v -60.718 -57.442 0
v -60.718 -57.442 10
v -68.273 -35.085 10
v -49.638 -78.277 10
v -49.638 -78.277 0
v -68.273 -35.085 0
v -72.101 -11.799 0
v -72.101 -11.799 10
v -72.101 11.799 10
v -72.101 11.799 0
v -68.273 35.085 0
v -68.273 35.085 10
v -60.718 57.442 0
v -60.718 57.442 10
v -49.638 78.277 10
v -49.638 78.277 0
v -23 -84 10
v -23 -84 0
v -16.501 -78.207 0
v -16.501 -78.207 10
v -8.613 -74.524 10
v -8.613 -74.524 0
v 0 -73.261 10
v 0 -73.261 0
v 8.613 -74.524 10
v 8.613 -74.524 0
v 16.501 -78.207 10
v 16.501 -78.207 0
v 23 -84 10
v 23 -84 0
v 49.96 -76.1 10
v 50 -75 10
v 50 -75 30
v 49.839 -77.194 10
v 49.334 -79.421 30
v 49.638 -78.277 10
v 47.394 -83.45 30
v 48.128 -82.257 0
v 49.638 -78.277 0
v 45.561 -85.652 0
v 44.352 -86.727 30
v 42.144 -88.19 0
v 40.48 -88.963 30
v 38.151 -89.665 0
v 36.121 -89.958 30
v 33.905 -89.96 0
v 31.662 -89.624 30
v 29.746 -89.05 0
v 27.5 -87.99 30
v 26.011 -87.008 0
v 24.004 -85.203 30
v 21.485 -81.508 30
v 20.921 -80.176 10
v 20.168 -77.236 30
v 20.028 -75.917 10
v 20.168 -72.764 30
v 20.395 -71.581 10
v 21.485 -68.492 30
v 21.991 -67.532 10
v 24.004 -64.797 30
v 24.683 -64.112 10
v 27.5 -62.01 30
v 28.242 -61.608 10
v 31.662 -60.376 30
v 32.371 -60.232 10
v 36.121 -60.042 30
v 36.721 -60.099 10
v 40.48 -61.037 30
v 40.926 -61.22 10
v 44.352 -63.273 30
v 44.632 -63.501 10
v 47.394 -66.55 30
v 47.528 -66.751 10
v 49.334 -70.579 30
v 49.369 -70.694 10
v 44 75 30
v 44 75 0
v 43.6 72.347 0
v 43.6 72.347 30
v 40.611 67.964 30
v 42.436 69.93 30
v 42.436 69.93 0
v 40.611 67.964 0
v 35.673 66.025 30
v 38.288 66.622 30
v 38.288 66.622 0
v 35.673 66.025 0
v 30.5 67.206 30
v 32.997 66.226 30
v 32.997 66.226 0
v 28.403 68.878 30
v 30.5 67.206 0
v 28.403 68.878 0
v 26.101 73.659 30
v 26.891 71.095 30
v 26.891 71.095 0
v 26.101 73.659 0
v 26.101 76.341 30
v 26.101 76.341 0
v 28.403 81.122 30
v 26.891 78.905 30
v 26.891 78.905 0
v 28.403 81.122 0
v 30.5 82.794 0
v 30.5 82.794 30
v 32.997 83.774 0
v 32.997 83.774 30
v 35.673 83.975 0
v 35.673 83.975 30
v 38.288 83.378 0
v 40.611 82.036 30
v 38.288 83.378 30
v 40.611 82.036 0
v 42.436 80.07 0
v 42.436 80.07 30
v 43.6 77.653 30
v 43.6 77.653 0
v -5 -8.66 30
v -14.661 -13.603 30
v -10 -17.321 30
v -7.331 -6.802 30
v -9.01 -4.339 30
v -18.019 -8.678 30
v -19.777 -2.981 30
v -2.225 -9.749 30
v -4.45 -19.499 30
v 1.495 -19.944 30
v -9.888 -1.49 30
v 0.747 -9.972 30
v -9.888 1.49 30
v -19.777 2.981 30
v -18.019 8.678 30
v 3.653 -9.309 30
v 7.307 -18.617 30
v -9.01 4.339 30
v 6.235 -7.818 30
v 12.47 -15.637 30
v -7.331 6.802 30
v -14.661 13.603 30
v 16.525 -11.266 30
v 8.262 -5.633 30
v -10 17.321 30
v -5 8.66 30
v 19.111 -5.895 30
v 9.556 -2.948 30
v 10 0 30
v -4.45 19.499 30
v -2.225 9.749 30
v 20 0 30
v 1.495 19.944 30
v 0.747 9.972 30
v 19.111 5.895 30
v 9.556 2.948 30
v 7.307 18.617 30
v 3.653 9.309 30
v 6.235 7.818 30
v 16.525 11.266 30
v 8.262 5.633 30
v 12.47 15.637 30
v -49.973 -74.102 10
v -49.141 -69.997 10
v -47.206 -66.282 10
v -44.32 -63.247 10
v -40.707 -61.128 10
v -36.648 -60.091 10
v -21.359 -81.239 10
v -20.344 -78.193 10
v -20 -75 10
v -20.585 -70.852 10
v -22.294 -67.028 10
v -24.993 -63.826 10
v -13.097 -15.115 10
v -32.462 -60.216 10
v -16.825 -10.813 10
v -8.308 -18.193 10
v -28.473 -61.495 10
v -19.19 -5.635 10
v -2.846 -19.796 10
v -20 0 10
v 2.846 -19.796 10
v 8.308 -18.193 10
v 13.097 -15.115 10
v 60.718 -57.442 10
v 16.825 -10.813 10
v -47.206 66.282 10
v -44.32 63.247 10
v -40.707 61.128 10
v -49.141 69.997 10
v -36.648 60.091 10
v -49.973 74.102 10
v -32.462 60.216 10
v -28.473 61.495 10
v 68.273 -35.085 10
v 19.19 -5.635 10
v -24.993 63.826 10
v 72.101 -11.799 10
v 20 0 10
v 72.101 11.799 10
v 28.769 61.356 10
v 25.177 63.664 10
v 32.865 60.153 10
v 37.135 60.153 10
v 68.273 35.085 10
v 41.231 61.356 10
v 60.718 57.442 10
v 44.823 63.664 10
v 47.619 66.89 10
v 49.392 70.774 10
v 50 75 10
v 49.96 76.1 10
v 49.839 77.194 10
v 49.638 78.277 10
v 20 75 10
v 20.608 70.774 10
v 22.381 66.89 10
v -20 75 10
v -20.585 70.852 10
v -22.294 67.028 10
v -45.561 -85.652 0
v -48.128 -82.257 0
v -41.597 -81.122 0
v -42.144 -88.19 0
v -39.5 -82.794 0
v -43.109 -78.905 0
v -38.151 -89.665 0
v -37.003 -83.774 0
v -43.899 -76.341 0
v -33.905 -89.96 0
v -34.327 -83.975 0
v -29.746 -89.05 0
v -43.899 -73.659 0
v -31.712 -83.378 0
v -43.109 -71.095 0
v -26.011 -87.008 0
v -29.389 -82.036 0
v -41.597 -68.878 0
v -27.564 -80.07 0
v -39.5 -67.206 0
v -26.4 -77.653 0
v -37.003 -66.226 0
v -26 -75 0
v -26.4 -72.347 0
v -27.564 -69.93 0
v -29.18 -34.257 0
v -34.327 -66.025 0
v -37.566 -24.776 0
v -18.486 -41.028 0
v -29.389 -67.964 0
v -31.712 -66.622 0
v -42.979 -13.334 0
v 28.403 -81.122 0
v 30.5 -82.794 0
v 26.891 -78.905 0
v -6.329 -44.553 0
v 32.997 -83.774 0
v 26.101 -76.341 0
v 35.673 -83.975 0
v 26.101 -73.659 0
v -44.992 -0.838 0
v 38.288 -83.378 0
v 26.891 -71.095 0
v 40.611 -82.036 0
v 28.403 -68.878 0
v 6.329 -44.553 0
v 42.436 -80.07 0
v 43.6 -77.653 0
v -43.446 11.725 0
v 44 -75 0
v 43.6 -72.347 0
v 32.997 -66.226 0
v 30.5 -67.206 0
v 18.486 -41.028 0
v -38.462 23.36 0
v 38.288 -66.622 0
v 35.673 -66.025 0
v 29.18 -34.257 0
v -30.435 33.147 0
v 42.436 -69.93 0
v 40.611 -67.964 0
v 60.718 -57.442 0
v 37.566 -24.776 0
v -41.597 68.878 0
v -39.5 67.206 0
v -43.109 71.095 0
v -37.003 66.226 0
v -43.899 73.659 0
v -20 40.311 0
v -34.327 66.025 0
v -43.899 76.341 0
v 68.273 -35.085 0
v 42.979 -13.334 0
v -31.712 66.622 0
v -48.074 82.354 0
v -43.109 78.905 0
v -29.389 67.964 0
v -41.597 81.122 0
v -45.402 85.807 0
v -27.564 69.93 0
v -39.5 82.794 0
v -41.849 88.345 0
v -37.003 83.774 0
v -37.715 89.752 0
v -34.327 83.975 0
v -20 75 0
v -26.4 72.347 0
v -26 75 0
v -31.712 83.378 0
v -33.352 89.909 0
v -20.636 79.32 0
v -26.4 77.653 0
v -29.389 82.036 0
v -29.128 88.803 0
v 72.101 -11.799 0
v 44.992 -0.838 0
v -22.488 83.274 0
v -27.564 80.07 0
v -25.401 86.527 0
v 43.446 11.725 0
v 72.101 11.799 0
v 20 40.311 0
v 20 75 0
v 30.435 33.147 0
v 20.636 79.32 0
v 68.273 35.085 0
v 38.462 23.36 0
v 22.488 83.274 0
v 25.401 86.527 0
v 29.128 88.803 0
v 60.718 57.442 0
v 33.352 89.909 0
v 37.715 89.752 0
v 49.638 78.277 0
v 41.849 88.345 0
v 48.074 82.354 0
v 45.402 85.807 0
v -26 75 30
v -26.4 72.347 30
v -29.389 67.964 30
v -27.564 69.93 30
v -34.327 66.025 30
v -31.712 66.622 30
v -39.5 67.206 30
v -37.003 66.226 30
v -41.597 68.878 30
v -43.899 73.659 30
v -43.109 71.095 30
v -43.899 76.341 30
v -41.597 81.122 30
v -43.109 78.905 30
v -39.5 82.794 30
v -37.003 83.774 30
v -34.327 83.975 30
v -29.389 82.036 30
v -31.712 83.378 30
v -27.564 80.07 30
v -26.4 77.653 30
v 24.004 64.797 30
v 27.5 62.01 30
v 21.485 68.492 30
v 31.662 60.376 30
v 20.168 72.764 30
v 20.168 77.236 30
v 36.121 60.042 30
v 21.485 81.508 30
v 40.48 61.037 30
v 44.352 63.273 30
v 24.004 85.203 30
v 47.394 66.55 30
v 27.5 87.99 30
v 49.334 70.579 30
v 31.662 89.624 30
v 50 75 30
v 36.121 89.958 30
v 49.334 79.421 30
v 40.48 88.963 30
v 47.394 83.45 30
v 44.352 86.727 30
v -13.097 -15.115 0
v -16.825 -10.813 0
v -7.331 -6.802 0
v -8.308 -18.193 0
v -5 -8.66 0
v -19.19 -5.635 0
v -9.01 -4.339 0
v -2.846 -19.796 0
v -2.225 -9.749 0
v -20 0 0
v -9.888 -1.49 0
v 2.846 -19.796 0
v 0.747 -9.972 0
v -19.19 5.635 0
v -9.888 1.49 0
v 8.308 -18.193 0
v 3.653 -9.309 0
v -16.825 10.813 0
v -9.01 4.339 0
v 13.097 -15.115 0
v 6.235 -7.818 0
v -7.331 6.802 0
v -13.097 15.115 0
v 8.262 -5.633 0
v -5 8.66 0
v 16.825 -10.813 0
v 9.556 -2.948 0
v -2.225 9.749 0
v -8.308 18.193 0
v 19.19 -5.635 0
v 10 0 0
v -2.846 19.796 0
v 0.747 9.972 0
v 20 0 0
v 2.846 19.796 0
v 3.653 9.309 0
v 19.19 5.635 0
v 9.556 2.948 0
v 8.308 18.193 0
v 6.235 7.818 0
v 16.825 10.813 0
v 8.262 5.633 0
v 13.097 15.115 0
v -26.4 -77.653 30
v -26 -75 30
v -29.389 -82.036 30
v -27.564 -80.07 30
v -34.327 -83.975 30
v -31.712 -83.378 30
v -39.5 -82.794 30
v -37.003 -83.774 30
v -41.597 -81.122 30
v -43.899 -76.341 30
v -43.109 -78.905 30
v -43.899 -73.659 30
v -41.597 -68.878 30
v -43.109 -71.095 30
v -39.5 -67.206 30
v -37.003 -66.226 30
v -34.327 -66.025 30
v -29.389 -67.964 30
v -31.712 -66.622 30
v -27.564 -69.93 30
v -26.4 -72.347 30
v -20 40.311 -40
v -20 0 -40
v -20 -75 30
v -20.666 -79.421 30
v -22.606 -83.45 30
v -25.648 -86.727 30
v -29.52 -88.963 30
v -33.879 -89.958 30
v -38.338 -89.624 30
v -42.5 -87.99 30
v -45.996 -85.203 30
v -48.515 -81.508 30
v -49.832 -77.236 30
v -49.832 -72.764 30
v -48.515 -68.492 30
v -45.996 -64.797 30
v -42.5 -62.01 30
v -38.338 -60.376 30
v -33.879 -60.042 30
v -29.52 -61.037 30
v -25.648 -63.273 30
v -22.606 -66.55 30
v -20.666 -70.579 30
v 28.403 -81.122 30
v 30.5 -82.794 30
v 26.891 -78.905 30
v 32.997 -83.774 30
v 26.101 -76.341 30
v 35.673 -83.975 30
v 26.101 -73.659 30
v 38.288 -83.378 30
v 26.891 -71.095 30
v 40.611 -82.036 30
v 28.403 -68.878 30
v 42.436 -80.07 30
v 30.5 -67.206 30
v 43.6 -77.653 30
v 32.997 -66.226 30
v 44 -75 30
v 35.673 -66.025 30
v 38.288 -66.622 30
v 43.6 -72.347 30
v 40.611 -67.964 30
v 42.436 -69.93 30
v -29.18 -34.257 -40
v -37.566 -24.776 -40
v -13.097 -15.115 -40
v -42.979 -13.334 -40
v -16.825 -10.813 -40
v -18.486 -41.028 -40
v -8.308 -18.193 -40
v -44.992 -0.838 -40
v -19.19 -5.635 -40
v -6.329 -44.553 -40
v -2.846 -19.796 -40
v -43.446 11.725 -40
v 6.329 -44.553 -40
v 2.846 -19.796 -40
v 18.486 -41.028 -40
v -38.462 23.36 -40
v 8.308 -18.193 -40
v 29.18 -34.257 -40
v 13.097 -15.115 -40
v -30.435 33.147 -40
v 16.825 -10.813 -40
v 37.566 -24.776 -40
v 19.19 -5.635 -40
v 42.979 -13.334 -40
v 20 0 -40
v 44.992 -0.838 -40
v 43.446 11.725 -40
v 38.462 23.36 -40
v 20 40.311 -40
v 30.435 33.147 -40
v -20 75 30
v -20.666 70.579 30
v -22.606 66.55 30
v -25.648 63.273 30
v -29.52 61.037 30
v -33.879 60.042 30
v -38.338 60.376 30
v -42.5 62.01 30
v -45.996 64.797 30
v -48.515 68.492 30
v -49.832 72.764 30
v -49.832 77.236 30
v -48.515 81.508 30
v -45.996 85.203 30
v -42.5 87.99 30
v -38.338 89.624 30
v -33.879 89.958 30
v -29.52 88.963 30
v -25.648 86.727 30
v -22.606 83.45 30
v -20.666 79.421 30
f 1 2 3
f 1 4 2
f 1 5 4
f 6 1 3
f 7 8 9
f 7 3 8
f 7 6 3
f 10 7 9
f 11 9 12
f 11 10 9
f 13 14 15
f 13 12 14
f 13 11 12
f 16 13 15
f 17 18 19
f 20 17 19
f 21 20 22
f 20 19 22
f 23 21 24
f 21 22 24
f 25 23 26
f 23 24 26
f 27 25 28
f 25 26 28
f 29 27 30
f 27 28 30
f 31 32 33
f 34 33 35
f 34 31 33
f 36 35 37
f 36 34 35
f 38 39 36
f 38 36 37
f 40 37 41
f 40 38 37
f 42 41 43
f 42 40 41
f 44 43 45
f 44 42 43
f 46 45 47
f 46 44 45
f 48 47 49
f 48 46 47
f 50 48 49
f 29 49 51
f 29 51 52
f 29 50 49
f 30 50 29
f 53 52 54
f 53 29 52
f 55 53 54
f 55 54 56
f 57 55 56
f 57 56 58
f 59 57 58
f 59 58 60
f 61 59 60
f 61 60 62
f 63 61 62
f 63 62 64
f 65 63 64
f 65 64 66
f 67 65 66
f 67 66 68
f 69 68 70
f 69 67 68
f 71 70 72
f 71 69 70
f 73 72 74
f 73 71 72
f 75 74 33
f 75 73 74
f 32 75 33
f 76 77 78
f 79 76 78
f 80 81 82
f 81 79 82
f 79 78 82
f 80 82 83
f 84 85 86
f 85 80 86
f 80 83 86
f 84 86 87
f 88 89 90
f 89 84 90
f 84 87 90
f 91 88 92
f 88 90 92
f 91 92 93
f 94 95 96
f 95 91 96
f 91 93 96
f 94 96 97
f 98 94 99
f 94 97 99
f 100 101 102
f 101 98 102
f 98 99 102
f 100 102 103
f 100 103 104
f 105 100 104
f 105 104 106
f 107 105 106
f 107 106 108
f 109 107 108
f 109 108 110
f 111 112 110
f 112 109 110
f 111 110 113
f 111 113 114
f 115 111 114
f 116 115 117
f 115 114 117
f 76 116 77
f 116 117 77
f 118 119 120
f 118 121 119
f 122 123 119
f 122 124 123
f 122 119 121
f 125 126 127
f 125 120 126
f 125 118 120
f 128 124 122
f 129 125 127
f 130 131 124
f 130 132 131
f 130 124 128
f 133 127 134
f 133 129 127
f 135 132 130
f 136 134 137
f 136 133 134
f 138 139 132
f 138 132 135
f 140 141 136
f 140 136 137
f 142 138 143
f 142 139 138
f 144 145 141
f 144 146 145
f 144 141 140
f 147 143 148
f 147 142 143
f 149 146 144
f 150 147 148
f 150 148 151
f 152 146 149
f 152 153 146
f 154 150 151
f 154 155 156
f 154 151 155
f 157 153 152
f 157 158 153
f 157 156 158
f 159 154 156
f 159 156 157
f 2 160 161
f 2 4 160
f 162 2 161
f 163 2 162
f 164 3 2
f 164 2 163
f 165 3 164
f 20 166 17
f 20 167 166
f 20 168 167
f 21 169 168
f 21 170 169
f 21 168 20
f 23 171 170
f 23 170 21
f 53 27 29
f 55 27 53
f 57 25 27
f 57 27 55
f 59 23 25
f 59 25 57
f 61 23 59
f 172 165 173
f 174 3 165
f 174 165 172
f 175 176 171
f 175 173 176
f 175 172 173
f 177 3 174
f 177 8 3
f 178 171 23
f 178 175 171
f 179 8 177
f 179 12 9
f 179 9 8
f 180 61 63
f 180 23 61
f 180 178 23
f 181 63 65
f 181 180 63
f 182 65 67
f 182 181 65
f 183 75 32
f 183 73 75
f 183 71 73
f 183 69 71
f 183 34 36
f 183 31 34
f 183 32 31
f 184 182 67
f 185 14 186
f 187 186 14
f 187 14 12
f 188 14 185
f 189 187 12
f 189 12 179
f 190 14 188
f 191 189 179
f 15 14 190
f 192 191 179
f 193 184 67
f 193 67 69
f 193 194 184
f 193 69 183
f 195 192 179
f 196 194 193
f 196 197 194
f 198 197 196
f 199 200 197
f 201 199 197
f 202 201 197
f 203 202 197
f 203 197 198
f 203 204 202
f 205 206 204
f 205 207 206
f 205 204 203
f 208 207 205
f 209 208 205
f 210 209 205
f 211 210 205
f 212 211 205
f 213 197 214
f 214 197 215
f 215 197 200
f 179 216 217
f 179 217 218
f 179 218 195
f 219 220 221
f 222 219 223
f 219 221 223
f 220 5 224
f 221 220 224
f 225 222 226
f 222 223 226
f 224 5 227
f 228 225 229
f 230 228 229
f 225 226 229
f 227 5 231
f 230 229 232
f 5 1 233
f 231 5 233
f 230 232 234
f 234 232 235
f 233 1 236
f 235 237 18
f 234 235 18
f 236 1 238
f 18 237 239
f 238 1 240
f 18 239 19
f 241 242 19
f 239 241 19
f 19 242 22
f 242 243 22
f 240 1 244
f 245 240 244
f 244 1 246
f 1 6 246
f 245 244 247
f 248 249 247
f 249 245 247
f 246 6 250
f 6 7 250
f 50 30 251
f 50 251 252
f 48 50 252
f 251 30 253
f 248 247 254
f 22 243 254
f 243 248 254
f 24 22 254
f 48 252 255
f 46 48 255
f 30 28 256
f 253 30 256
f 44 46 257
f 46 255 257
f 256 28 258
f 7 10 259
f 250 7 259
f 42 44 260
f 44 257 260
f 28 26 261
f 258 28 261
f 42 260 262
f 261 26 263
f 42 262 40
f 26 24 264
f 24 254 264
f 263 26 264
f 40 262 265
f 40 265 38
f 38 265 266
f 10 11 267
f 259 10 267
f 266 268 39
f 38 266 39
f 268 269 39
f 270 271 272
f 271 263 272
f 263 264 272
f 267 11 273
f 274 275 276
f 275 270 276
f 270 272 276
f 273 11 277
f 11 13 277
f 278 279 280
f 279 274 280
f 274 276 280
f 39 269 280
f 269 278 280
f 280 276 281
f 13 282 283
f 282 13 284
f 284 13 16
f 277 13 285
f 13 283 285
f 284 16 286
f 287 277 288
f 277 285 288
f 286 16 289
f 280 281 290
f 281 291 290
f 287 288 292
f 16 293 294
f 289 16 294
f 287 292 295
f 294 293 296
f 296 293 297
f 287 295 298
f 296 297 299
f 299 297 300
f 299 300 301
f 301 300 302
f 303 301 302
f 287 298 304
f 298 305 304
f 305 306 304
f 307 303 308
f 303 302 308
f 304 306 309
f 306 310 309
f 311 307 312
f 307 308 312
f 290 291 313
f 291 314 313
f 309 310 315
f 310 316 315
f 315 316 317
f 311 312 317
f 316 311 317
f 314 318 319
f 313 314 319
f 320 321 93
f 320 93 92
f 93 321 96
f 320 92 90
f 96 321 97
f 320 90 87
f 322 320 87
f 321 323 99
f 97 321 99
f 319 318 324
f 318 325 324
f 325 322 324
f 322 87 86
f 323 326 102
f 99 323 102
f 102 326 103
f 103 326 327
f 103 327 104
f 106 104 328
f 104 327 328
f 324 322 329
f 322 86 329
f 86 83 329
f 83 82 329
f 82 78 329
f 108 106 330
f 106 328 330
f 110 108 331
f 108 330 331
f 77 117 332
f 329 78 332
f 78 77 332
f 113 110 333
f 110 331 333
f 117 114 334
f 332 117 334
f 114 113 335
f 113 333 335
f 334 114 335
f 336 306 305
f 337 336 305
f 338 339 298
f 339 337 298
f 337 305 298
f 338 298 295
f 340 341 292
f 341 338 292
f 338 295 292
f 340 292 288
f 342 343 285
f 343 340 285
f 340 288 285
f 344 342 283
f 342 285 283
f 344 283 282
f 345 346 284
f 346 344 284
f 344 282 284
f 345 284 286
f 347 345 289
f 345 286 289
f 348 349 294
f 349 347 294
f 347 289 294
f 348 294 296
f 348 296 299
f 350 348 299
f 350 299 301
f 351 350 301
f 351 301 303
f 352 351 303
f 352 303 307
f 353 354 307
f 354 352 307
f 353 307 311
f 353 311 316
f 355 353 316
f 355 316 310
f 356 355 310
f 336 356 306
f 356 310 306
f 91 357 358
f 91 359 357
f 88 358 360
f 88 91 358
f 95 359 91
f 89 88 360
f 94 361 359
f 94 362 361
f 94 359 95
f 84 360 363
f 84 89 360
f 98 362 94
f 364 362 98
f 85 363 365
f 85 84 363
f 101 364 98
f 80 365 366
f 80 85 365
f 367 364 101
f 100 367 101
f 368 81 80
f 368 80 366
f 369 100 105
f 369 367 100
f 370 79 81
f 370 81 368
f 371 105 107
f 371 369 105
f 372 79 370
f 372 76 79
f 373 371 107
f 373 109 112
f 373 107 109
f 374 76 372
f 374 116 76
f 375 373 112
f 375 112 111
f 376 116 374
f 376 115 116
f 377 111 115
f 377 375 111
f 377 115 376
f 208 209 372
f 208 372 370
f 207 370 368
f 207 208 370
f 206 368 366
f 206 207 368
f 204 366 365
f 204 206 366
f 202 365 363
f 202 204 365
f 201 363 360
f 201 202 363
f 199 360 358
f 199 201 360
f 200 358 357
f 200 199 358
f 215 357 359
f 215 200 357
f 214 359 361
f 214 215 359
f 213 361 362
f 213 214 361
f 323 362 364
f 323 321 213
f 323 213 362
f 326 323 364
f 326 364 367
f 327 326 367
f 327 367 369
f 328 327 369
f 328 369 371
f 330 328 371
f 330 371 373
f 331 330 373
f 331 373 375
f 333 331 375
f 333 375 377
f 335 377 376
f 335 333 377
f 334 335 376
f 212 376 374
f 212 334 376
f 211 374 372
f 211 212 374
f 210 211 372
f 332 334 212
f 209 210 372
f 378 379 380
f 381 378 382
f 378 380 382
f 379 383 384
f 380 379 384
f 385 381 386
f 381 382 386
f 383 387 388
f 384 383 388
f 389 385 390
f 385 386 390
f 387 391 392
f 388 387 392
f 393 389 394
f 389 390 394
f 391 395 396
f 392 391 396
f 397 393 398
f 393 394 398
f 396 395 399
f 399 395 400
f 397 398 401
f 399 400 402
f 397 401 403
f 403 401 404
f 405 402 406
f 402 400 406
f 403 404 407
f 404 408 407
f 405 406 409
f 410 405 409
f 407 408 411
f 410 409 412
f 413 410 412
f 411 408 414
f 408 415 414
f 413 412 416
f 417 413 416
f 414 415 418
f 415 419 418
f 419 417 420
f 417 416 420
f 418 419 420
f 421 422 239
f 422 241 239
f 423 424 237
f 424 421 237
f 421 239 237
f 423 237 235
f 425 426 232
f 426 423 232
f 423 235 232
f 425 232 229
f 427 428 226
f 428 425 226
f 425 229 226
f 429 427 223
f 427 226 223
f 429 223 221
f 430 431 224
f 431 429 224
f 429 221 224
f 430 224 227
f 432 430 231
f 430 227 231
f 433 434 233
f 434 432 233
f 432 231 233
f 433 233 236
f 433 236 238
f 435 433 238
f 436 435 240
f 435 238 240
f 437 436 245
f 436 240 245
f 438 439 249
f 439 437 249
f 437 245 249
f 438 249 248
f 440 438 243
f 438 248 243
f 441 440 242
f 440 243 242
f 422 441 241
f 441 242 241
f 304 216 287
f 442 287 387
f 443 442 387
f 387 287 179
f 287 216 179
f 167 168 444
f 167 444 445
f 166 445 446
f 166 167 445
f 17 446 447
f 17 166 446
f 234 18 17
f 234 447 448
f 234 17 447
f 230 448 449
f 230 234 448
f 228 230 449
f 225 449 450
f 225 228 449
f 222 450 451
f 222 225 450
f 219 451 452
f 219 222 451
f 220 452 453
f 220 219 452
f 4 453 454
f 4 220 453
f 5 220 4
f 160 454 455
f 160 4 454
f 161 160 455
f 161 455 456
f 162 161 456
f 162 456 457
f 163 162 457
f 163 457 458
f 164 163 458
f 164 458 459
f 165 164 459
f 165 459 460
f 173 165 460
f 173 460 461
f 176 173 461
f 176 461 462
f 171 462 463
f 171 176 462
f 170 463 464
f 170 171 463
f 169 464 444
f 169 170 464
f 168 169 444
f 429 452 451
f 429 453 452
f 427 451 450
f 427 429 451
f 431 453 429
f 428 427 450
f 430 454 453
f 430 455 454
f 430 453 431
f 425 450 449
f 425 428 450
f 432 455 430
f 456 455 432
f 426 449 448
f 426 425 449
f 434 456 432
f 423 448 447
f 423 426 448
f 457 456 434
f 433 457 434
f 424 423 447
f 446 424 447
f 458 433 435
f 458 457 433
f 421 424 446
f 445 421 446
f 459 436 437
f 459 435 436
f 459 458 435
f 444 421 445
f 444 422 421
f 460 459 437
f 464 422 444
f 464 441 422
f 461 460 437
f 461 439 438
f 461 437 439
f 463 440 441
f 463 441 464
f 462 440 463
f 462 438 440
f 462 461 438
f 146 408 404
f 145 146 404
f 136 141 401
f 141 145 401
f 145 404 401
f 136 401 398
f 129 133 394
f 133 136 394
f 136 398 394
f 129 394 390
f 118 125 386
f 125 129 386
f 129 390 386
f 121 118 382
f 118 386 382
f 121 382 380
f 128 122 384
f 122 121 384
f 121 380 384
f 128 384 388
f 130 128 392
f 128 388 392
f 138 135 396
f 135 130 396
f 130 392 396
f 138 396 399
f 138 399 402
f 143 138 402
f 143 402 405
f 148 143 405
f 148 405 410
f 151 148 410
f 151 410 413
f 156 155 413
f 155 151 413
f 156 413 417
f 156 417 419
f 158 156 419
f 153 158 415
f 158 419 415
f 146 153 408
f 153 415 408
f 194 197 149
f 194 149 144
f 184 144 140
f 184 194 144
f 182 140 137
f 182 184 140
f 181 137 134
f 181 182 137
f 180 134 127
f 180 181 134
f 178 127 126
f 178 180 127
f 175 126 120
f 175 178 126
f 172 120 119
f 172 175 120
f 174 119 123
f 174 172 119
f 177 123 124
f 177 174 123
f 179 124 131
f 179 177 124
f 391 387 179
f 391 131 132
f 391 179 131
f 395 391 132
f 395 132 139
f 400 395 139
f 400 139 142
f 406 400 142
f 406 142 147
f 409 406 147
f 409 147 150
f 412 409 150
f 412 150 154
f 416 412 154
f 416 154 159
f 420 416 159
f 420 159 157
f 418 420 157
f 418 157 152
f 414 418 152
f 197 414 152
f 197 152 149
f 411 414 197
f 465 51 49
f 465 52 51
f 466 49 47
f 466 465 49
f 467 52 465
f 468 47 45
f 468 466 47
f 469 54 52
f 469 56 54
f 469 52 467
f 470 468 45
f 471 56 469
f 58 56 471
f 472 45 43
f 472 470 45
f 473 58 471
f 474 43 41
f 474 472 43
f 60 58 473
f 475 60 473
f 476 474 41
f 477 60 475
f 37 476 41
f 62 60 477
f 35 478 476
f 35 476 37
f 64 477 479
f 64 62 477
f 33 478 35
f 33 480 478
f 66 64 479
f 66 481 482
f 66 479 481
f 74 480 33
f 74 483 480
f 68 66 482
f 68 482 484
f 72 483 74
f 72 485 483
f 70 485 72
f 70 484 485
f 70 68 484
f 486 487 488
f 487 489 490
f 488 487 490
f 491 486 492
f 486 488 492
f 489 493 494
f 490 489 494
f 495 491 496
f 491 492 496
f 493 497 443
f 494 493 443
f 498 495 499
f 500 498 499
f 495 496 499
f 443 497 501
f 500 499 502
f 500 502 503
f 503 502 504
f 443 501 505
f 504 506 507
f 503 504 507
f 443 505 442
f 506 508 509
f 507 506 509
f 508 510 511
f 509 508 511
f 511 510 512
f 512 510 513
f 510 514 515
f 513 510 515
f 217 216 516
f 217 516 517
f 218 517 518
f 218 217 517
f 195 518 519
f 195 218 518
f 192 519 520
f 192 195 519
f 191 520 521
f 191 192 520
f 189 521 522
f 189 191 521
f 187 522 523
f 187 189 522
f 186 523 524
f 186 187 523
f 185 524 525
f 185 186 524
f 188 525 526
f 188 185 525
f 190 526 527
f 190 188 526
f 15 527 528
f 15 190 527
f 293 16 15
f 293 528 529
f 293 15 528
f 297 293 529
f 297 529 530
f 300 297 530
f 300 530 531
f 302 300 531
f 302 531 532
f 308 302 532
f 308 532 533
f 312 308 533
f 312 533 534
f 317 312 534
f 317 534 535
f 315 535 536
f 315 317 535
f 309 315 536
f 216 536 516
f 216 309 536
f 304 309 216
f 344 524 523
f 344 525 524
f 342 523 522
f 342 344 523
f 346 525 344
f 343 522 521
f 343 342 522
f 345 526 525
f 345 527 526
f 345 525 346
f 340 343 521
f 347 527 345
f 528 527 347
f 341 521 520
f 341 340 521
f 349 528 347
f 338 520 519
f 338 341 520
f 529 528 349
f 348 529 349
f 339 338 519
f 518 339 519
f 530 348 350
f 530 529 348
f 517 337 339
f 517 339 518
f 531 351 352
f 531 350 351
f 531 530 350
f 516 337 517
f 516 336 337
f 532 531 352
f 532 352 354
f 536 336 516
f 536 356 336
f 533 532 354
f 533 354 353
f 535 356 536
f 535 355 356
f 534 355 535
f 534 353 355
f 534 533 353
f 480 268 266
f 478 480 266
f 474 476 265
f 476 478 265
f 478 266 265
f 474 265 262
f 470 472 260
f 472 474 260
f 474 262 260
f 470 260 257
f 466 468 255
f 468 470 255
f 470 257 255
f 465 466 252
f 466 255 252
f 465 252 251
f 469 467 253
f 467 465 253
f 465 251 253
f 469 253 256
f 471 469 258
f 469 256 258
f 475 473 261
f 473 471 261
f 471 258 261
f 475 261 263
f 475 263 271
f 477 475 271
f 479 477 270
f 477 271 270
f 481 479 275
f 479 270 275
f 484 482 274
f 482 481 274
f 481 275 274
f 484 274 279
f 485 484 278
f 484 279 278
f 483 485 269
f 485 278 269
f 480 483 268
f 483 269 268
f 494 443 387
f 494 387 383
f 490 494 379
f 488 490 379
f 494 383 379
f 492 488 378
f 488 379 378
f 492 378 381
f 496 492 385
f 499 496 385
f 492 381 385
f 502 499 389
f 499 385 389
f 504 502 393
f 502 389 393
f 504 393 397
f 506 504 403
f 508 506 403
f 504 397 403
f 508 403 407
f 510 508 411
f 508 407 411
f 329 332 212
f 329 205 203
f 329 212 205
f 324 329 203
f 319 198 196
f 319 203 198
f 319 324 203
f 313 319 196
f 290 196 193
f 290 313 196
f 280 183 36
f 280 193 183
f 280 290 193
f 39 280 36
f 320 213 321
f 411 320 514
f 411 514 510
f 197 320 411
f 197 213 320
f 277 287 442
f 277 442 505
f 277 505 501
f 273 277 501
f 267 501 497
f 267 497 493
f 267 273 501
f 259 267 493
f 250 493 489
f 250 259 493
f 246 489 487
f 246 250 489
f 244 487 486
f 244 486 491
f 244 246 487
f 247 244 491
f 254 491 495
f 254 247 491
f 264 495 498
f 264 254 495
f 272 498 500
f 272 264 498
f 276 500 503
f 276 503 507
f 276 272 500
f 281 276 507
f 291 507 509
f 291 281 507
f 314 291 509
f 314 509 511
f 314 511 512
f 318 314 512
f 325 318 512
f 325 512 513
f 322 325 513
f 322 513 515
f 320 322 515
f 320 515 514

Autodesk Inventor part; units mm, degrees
ref_plane "YZ Plane" through (0, 0, 0) normal (1, 0, 0) x (0, 1, 0)
ref_plane "XZ Plane" through (0, 0, 0) normal (0, 1, 0) x (-1, 0, 0)
ref_plane "XY Plane" through (0, 0, 0) normal (0, 0, 1) x (1, 0, 0)
sketch "Эскиз1" plane through (0, 0, 0) normal (0, 0, 1) x (1, 0, 0)
  circle A0 centre (0, 0) radius 20
  circle A1 centre (0, 0) radius 10
  circle A2 centre (-35, 75) radius 15
  circle A3 centre (-35, 75) radius 9
  circle A4 centre (35, 75) radius 15
  circle A5 centre (35, 75) radius 9
  circle A6 centre (-35, -75) radius 15
  circle A7 centre (-35, -75) radius 9
  circle A8 centre (35, -75) radius 15
  circle A9 centre (35, -75) radius 9
  arc A10 (23, -84) -> (-23, -84) centre (0, -103.2614) ccw
  arc A11 (-20, 40.3113) -> (20, 40.3113) centre (0, 0) ccw
  line L0 (-20, 40.3113) -> (-20, 0)
  line L1 (-20, 40.3113) -> (-20, 75)
  line L2 (20, 40.3113) -> (20, 0)
  line L3 (20, 40.3113) -> (20, 75)
  arc A12 (-49.6377, 78.2768) -> (-49.6377, -78.2768) centre (72.4186, 0) ccw
  arc A13 (49.6377, -78.2768) -> (49.6377, 78.2768) centre (-72.4186, 0) ccw
  dimension "d75" = 145
  dimension "d76" = 30
  dimension "d77" = 18
  dimension "d78" = 45
  dimension "d79" = 40
  dimension "d80" = 20
  dimension "d81" = 30
  dimension "d82" = 20
  dimension "d83" = 52.4186
  dimension "d84" = 29.6377
  dimension "d85" = 29.6377
  dimension "d86" = 3
  dimension "d87" = 20
  dimension "d88" = 43
  dimension "d89" = 69.6377
  dimension "d90" = 69.6377
  dimension "d91" = 92.4186
  dimension "d92" = 72.4186
  dimension "d93" = 45
extrude "Выдавливание1" add sketch "Эскиз1" along normal blind 10 contours L3 A4 A13 A8 A10 A6 A12 A2 L1 A11
extrude "Выдавливание2" add sketch "Эскиз1" along normal blind 30 contours A4 | A2 | A8 | A6
extrude "Выдавливание3" add sketch "Эскиз1" along normal blind 30 contours A0
extrude "Выдавливание4" add sketch "Эскиз1" along normal blind 10 contours L2 A11 L0 A0
extrude "Выдавливание5" add sketch "Эскиз1" against normal blind 40 contours L2 A11 L0 A0
properties part number "Вилка" material "Сталь, мягкая"
